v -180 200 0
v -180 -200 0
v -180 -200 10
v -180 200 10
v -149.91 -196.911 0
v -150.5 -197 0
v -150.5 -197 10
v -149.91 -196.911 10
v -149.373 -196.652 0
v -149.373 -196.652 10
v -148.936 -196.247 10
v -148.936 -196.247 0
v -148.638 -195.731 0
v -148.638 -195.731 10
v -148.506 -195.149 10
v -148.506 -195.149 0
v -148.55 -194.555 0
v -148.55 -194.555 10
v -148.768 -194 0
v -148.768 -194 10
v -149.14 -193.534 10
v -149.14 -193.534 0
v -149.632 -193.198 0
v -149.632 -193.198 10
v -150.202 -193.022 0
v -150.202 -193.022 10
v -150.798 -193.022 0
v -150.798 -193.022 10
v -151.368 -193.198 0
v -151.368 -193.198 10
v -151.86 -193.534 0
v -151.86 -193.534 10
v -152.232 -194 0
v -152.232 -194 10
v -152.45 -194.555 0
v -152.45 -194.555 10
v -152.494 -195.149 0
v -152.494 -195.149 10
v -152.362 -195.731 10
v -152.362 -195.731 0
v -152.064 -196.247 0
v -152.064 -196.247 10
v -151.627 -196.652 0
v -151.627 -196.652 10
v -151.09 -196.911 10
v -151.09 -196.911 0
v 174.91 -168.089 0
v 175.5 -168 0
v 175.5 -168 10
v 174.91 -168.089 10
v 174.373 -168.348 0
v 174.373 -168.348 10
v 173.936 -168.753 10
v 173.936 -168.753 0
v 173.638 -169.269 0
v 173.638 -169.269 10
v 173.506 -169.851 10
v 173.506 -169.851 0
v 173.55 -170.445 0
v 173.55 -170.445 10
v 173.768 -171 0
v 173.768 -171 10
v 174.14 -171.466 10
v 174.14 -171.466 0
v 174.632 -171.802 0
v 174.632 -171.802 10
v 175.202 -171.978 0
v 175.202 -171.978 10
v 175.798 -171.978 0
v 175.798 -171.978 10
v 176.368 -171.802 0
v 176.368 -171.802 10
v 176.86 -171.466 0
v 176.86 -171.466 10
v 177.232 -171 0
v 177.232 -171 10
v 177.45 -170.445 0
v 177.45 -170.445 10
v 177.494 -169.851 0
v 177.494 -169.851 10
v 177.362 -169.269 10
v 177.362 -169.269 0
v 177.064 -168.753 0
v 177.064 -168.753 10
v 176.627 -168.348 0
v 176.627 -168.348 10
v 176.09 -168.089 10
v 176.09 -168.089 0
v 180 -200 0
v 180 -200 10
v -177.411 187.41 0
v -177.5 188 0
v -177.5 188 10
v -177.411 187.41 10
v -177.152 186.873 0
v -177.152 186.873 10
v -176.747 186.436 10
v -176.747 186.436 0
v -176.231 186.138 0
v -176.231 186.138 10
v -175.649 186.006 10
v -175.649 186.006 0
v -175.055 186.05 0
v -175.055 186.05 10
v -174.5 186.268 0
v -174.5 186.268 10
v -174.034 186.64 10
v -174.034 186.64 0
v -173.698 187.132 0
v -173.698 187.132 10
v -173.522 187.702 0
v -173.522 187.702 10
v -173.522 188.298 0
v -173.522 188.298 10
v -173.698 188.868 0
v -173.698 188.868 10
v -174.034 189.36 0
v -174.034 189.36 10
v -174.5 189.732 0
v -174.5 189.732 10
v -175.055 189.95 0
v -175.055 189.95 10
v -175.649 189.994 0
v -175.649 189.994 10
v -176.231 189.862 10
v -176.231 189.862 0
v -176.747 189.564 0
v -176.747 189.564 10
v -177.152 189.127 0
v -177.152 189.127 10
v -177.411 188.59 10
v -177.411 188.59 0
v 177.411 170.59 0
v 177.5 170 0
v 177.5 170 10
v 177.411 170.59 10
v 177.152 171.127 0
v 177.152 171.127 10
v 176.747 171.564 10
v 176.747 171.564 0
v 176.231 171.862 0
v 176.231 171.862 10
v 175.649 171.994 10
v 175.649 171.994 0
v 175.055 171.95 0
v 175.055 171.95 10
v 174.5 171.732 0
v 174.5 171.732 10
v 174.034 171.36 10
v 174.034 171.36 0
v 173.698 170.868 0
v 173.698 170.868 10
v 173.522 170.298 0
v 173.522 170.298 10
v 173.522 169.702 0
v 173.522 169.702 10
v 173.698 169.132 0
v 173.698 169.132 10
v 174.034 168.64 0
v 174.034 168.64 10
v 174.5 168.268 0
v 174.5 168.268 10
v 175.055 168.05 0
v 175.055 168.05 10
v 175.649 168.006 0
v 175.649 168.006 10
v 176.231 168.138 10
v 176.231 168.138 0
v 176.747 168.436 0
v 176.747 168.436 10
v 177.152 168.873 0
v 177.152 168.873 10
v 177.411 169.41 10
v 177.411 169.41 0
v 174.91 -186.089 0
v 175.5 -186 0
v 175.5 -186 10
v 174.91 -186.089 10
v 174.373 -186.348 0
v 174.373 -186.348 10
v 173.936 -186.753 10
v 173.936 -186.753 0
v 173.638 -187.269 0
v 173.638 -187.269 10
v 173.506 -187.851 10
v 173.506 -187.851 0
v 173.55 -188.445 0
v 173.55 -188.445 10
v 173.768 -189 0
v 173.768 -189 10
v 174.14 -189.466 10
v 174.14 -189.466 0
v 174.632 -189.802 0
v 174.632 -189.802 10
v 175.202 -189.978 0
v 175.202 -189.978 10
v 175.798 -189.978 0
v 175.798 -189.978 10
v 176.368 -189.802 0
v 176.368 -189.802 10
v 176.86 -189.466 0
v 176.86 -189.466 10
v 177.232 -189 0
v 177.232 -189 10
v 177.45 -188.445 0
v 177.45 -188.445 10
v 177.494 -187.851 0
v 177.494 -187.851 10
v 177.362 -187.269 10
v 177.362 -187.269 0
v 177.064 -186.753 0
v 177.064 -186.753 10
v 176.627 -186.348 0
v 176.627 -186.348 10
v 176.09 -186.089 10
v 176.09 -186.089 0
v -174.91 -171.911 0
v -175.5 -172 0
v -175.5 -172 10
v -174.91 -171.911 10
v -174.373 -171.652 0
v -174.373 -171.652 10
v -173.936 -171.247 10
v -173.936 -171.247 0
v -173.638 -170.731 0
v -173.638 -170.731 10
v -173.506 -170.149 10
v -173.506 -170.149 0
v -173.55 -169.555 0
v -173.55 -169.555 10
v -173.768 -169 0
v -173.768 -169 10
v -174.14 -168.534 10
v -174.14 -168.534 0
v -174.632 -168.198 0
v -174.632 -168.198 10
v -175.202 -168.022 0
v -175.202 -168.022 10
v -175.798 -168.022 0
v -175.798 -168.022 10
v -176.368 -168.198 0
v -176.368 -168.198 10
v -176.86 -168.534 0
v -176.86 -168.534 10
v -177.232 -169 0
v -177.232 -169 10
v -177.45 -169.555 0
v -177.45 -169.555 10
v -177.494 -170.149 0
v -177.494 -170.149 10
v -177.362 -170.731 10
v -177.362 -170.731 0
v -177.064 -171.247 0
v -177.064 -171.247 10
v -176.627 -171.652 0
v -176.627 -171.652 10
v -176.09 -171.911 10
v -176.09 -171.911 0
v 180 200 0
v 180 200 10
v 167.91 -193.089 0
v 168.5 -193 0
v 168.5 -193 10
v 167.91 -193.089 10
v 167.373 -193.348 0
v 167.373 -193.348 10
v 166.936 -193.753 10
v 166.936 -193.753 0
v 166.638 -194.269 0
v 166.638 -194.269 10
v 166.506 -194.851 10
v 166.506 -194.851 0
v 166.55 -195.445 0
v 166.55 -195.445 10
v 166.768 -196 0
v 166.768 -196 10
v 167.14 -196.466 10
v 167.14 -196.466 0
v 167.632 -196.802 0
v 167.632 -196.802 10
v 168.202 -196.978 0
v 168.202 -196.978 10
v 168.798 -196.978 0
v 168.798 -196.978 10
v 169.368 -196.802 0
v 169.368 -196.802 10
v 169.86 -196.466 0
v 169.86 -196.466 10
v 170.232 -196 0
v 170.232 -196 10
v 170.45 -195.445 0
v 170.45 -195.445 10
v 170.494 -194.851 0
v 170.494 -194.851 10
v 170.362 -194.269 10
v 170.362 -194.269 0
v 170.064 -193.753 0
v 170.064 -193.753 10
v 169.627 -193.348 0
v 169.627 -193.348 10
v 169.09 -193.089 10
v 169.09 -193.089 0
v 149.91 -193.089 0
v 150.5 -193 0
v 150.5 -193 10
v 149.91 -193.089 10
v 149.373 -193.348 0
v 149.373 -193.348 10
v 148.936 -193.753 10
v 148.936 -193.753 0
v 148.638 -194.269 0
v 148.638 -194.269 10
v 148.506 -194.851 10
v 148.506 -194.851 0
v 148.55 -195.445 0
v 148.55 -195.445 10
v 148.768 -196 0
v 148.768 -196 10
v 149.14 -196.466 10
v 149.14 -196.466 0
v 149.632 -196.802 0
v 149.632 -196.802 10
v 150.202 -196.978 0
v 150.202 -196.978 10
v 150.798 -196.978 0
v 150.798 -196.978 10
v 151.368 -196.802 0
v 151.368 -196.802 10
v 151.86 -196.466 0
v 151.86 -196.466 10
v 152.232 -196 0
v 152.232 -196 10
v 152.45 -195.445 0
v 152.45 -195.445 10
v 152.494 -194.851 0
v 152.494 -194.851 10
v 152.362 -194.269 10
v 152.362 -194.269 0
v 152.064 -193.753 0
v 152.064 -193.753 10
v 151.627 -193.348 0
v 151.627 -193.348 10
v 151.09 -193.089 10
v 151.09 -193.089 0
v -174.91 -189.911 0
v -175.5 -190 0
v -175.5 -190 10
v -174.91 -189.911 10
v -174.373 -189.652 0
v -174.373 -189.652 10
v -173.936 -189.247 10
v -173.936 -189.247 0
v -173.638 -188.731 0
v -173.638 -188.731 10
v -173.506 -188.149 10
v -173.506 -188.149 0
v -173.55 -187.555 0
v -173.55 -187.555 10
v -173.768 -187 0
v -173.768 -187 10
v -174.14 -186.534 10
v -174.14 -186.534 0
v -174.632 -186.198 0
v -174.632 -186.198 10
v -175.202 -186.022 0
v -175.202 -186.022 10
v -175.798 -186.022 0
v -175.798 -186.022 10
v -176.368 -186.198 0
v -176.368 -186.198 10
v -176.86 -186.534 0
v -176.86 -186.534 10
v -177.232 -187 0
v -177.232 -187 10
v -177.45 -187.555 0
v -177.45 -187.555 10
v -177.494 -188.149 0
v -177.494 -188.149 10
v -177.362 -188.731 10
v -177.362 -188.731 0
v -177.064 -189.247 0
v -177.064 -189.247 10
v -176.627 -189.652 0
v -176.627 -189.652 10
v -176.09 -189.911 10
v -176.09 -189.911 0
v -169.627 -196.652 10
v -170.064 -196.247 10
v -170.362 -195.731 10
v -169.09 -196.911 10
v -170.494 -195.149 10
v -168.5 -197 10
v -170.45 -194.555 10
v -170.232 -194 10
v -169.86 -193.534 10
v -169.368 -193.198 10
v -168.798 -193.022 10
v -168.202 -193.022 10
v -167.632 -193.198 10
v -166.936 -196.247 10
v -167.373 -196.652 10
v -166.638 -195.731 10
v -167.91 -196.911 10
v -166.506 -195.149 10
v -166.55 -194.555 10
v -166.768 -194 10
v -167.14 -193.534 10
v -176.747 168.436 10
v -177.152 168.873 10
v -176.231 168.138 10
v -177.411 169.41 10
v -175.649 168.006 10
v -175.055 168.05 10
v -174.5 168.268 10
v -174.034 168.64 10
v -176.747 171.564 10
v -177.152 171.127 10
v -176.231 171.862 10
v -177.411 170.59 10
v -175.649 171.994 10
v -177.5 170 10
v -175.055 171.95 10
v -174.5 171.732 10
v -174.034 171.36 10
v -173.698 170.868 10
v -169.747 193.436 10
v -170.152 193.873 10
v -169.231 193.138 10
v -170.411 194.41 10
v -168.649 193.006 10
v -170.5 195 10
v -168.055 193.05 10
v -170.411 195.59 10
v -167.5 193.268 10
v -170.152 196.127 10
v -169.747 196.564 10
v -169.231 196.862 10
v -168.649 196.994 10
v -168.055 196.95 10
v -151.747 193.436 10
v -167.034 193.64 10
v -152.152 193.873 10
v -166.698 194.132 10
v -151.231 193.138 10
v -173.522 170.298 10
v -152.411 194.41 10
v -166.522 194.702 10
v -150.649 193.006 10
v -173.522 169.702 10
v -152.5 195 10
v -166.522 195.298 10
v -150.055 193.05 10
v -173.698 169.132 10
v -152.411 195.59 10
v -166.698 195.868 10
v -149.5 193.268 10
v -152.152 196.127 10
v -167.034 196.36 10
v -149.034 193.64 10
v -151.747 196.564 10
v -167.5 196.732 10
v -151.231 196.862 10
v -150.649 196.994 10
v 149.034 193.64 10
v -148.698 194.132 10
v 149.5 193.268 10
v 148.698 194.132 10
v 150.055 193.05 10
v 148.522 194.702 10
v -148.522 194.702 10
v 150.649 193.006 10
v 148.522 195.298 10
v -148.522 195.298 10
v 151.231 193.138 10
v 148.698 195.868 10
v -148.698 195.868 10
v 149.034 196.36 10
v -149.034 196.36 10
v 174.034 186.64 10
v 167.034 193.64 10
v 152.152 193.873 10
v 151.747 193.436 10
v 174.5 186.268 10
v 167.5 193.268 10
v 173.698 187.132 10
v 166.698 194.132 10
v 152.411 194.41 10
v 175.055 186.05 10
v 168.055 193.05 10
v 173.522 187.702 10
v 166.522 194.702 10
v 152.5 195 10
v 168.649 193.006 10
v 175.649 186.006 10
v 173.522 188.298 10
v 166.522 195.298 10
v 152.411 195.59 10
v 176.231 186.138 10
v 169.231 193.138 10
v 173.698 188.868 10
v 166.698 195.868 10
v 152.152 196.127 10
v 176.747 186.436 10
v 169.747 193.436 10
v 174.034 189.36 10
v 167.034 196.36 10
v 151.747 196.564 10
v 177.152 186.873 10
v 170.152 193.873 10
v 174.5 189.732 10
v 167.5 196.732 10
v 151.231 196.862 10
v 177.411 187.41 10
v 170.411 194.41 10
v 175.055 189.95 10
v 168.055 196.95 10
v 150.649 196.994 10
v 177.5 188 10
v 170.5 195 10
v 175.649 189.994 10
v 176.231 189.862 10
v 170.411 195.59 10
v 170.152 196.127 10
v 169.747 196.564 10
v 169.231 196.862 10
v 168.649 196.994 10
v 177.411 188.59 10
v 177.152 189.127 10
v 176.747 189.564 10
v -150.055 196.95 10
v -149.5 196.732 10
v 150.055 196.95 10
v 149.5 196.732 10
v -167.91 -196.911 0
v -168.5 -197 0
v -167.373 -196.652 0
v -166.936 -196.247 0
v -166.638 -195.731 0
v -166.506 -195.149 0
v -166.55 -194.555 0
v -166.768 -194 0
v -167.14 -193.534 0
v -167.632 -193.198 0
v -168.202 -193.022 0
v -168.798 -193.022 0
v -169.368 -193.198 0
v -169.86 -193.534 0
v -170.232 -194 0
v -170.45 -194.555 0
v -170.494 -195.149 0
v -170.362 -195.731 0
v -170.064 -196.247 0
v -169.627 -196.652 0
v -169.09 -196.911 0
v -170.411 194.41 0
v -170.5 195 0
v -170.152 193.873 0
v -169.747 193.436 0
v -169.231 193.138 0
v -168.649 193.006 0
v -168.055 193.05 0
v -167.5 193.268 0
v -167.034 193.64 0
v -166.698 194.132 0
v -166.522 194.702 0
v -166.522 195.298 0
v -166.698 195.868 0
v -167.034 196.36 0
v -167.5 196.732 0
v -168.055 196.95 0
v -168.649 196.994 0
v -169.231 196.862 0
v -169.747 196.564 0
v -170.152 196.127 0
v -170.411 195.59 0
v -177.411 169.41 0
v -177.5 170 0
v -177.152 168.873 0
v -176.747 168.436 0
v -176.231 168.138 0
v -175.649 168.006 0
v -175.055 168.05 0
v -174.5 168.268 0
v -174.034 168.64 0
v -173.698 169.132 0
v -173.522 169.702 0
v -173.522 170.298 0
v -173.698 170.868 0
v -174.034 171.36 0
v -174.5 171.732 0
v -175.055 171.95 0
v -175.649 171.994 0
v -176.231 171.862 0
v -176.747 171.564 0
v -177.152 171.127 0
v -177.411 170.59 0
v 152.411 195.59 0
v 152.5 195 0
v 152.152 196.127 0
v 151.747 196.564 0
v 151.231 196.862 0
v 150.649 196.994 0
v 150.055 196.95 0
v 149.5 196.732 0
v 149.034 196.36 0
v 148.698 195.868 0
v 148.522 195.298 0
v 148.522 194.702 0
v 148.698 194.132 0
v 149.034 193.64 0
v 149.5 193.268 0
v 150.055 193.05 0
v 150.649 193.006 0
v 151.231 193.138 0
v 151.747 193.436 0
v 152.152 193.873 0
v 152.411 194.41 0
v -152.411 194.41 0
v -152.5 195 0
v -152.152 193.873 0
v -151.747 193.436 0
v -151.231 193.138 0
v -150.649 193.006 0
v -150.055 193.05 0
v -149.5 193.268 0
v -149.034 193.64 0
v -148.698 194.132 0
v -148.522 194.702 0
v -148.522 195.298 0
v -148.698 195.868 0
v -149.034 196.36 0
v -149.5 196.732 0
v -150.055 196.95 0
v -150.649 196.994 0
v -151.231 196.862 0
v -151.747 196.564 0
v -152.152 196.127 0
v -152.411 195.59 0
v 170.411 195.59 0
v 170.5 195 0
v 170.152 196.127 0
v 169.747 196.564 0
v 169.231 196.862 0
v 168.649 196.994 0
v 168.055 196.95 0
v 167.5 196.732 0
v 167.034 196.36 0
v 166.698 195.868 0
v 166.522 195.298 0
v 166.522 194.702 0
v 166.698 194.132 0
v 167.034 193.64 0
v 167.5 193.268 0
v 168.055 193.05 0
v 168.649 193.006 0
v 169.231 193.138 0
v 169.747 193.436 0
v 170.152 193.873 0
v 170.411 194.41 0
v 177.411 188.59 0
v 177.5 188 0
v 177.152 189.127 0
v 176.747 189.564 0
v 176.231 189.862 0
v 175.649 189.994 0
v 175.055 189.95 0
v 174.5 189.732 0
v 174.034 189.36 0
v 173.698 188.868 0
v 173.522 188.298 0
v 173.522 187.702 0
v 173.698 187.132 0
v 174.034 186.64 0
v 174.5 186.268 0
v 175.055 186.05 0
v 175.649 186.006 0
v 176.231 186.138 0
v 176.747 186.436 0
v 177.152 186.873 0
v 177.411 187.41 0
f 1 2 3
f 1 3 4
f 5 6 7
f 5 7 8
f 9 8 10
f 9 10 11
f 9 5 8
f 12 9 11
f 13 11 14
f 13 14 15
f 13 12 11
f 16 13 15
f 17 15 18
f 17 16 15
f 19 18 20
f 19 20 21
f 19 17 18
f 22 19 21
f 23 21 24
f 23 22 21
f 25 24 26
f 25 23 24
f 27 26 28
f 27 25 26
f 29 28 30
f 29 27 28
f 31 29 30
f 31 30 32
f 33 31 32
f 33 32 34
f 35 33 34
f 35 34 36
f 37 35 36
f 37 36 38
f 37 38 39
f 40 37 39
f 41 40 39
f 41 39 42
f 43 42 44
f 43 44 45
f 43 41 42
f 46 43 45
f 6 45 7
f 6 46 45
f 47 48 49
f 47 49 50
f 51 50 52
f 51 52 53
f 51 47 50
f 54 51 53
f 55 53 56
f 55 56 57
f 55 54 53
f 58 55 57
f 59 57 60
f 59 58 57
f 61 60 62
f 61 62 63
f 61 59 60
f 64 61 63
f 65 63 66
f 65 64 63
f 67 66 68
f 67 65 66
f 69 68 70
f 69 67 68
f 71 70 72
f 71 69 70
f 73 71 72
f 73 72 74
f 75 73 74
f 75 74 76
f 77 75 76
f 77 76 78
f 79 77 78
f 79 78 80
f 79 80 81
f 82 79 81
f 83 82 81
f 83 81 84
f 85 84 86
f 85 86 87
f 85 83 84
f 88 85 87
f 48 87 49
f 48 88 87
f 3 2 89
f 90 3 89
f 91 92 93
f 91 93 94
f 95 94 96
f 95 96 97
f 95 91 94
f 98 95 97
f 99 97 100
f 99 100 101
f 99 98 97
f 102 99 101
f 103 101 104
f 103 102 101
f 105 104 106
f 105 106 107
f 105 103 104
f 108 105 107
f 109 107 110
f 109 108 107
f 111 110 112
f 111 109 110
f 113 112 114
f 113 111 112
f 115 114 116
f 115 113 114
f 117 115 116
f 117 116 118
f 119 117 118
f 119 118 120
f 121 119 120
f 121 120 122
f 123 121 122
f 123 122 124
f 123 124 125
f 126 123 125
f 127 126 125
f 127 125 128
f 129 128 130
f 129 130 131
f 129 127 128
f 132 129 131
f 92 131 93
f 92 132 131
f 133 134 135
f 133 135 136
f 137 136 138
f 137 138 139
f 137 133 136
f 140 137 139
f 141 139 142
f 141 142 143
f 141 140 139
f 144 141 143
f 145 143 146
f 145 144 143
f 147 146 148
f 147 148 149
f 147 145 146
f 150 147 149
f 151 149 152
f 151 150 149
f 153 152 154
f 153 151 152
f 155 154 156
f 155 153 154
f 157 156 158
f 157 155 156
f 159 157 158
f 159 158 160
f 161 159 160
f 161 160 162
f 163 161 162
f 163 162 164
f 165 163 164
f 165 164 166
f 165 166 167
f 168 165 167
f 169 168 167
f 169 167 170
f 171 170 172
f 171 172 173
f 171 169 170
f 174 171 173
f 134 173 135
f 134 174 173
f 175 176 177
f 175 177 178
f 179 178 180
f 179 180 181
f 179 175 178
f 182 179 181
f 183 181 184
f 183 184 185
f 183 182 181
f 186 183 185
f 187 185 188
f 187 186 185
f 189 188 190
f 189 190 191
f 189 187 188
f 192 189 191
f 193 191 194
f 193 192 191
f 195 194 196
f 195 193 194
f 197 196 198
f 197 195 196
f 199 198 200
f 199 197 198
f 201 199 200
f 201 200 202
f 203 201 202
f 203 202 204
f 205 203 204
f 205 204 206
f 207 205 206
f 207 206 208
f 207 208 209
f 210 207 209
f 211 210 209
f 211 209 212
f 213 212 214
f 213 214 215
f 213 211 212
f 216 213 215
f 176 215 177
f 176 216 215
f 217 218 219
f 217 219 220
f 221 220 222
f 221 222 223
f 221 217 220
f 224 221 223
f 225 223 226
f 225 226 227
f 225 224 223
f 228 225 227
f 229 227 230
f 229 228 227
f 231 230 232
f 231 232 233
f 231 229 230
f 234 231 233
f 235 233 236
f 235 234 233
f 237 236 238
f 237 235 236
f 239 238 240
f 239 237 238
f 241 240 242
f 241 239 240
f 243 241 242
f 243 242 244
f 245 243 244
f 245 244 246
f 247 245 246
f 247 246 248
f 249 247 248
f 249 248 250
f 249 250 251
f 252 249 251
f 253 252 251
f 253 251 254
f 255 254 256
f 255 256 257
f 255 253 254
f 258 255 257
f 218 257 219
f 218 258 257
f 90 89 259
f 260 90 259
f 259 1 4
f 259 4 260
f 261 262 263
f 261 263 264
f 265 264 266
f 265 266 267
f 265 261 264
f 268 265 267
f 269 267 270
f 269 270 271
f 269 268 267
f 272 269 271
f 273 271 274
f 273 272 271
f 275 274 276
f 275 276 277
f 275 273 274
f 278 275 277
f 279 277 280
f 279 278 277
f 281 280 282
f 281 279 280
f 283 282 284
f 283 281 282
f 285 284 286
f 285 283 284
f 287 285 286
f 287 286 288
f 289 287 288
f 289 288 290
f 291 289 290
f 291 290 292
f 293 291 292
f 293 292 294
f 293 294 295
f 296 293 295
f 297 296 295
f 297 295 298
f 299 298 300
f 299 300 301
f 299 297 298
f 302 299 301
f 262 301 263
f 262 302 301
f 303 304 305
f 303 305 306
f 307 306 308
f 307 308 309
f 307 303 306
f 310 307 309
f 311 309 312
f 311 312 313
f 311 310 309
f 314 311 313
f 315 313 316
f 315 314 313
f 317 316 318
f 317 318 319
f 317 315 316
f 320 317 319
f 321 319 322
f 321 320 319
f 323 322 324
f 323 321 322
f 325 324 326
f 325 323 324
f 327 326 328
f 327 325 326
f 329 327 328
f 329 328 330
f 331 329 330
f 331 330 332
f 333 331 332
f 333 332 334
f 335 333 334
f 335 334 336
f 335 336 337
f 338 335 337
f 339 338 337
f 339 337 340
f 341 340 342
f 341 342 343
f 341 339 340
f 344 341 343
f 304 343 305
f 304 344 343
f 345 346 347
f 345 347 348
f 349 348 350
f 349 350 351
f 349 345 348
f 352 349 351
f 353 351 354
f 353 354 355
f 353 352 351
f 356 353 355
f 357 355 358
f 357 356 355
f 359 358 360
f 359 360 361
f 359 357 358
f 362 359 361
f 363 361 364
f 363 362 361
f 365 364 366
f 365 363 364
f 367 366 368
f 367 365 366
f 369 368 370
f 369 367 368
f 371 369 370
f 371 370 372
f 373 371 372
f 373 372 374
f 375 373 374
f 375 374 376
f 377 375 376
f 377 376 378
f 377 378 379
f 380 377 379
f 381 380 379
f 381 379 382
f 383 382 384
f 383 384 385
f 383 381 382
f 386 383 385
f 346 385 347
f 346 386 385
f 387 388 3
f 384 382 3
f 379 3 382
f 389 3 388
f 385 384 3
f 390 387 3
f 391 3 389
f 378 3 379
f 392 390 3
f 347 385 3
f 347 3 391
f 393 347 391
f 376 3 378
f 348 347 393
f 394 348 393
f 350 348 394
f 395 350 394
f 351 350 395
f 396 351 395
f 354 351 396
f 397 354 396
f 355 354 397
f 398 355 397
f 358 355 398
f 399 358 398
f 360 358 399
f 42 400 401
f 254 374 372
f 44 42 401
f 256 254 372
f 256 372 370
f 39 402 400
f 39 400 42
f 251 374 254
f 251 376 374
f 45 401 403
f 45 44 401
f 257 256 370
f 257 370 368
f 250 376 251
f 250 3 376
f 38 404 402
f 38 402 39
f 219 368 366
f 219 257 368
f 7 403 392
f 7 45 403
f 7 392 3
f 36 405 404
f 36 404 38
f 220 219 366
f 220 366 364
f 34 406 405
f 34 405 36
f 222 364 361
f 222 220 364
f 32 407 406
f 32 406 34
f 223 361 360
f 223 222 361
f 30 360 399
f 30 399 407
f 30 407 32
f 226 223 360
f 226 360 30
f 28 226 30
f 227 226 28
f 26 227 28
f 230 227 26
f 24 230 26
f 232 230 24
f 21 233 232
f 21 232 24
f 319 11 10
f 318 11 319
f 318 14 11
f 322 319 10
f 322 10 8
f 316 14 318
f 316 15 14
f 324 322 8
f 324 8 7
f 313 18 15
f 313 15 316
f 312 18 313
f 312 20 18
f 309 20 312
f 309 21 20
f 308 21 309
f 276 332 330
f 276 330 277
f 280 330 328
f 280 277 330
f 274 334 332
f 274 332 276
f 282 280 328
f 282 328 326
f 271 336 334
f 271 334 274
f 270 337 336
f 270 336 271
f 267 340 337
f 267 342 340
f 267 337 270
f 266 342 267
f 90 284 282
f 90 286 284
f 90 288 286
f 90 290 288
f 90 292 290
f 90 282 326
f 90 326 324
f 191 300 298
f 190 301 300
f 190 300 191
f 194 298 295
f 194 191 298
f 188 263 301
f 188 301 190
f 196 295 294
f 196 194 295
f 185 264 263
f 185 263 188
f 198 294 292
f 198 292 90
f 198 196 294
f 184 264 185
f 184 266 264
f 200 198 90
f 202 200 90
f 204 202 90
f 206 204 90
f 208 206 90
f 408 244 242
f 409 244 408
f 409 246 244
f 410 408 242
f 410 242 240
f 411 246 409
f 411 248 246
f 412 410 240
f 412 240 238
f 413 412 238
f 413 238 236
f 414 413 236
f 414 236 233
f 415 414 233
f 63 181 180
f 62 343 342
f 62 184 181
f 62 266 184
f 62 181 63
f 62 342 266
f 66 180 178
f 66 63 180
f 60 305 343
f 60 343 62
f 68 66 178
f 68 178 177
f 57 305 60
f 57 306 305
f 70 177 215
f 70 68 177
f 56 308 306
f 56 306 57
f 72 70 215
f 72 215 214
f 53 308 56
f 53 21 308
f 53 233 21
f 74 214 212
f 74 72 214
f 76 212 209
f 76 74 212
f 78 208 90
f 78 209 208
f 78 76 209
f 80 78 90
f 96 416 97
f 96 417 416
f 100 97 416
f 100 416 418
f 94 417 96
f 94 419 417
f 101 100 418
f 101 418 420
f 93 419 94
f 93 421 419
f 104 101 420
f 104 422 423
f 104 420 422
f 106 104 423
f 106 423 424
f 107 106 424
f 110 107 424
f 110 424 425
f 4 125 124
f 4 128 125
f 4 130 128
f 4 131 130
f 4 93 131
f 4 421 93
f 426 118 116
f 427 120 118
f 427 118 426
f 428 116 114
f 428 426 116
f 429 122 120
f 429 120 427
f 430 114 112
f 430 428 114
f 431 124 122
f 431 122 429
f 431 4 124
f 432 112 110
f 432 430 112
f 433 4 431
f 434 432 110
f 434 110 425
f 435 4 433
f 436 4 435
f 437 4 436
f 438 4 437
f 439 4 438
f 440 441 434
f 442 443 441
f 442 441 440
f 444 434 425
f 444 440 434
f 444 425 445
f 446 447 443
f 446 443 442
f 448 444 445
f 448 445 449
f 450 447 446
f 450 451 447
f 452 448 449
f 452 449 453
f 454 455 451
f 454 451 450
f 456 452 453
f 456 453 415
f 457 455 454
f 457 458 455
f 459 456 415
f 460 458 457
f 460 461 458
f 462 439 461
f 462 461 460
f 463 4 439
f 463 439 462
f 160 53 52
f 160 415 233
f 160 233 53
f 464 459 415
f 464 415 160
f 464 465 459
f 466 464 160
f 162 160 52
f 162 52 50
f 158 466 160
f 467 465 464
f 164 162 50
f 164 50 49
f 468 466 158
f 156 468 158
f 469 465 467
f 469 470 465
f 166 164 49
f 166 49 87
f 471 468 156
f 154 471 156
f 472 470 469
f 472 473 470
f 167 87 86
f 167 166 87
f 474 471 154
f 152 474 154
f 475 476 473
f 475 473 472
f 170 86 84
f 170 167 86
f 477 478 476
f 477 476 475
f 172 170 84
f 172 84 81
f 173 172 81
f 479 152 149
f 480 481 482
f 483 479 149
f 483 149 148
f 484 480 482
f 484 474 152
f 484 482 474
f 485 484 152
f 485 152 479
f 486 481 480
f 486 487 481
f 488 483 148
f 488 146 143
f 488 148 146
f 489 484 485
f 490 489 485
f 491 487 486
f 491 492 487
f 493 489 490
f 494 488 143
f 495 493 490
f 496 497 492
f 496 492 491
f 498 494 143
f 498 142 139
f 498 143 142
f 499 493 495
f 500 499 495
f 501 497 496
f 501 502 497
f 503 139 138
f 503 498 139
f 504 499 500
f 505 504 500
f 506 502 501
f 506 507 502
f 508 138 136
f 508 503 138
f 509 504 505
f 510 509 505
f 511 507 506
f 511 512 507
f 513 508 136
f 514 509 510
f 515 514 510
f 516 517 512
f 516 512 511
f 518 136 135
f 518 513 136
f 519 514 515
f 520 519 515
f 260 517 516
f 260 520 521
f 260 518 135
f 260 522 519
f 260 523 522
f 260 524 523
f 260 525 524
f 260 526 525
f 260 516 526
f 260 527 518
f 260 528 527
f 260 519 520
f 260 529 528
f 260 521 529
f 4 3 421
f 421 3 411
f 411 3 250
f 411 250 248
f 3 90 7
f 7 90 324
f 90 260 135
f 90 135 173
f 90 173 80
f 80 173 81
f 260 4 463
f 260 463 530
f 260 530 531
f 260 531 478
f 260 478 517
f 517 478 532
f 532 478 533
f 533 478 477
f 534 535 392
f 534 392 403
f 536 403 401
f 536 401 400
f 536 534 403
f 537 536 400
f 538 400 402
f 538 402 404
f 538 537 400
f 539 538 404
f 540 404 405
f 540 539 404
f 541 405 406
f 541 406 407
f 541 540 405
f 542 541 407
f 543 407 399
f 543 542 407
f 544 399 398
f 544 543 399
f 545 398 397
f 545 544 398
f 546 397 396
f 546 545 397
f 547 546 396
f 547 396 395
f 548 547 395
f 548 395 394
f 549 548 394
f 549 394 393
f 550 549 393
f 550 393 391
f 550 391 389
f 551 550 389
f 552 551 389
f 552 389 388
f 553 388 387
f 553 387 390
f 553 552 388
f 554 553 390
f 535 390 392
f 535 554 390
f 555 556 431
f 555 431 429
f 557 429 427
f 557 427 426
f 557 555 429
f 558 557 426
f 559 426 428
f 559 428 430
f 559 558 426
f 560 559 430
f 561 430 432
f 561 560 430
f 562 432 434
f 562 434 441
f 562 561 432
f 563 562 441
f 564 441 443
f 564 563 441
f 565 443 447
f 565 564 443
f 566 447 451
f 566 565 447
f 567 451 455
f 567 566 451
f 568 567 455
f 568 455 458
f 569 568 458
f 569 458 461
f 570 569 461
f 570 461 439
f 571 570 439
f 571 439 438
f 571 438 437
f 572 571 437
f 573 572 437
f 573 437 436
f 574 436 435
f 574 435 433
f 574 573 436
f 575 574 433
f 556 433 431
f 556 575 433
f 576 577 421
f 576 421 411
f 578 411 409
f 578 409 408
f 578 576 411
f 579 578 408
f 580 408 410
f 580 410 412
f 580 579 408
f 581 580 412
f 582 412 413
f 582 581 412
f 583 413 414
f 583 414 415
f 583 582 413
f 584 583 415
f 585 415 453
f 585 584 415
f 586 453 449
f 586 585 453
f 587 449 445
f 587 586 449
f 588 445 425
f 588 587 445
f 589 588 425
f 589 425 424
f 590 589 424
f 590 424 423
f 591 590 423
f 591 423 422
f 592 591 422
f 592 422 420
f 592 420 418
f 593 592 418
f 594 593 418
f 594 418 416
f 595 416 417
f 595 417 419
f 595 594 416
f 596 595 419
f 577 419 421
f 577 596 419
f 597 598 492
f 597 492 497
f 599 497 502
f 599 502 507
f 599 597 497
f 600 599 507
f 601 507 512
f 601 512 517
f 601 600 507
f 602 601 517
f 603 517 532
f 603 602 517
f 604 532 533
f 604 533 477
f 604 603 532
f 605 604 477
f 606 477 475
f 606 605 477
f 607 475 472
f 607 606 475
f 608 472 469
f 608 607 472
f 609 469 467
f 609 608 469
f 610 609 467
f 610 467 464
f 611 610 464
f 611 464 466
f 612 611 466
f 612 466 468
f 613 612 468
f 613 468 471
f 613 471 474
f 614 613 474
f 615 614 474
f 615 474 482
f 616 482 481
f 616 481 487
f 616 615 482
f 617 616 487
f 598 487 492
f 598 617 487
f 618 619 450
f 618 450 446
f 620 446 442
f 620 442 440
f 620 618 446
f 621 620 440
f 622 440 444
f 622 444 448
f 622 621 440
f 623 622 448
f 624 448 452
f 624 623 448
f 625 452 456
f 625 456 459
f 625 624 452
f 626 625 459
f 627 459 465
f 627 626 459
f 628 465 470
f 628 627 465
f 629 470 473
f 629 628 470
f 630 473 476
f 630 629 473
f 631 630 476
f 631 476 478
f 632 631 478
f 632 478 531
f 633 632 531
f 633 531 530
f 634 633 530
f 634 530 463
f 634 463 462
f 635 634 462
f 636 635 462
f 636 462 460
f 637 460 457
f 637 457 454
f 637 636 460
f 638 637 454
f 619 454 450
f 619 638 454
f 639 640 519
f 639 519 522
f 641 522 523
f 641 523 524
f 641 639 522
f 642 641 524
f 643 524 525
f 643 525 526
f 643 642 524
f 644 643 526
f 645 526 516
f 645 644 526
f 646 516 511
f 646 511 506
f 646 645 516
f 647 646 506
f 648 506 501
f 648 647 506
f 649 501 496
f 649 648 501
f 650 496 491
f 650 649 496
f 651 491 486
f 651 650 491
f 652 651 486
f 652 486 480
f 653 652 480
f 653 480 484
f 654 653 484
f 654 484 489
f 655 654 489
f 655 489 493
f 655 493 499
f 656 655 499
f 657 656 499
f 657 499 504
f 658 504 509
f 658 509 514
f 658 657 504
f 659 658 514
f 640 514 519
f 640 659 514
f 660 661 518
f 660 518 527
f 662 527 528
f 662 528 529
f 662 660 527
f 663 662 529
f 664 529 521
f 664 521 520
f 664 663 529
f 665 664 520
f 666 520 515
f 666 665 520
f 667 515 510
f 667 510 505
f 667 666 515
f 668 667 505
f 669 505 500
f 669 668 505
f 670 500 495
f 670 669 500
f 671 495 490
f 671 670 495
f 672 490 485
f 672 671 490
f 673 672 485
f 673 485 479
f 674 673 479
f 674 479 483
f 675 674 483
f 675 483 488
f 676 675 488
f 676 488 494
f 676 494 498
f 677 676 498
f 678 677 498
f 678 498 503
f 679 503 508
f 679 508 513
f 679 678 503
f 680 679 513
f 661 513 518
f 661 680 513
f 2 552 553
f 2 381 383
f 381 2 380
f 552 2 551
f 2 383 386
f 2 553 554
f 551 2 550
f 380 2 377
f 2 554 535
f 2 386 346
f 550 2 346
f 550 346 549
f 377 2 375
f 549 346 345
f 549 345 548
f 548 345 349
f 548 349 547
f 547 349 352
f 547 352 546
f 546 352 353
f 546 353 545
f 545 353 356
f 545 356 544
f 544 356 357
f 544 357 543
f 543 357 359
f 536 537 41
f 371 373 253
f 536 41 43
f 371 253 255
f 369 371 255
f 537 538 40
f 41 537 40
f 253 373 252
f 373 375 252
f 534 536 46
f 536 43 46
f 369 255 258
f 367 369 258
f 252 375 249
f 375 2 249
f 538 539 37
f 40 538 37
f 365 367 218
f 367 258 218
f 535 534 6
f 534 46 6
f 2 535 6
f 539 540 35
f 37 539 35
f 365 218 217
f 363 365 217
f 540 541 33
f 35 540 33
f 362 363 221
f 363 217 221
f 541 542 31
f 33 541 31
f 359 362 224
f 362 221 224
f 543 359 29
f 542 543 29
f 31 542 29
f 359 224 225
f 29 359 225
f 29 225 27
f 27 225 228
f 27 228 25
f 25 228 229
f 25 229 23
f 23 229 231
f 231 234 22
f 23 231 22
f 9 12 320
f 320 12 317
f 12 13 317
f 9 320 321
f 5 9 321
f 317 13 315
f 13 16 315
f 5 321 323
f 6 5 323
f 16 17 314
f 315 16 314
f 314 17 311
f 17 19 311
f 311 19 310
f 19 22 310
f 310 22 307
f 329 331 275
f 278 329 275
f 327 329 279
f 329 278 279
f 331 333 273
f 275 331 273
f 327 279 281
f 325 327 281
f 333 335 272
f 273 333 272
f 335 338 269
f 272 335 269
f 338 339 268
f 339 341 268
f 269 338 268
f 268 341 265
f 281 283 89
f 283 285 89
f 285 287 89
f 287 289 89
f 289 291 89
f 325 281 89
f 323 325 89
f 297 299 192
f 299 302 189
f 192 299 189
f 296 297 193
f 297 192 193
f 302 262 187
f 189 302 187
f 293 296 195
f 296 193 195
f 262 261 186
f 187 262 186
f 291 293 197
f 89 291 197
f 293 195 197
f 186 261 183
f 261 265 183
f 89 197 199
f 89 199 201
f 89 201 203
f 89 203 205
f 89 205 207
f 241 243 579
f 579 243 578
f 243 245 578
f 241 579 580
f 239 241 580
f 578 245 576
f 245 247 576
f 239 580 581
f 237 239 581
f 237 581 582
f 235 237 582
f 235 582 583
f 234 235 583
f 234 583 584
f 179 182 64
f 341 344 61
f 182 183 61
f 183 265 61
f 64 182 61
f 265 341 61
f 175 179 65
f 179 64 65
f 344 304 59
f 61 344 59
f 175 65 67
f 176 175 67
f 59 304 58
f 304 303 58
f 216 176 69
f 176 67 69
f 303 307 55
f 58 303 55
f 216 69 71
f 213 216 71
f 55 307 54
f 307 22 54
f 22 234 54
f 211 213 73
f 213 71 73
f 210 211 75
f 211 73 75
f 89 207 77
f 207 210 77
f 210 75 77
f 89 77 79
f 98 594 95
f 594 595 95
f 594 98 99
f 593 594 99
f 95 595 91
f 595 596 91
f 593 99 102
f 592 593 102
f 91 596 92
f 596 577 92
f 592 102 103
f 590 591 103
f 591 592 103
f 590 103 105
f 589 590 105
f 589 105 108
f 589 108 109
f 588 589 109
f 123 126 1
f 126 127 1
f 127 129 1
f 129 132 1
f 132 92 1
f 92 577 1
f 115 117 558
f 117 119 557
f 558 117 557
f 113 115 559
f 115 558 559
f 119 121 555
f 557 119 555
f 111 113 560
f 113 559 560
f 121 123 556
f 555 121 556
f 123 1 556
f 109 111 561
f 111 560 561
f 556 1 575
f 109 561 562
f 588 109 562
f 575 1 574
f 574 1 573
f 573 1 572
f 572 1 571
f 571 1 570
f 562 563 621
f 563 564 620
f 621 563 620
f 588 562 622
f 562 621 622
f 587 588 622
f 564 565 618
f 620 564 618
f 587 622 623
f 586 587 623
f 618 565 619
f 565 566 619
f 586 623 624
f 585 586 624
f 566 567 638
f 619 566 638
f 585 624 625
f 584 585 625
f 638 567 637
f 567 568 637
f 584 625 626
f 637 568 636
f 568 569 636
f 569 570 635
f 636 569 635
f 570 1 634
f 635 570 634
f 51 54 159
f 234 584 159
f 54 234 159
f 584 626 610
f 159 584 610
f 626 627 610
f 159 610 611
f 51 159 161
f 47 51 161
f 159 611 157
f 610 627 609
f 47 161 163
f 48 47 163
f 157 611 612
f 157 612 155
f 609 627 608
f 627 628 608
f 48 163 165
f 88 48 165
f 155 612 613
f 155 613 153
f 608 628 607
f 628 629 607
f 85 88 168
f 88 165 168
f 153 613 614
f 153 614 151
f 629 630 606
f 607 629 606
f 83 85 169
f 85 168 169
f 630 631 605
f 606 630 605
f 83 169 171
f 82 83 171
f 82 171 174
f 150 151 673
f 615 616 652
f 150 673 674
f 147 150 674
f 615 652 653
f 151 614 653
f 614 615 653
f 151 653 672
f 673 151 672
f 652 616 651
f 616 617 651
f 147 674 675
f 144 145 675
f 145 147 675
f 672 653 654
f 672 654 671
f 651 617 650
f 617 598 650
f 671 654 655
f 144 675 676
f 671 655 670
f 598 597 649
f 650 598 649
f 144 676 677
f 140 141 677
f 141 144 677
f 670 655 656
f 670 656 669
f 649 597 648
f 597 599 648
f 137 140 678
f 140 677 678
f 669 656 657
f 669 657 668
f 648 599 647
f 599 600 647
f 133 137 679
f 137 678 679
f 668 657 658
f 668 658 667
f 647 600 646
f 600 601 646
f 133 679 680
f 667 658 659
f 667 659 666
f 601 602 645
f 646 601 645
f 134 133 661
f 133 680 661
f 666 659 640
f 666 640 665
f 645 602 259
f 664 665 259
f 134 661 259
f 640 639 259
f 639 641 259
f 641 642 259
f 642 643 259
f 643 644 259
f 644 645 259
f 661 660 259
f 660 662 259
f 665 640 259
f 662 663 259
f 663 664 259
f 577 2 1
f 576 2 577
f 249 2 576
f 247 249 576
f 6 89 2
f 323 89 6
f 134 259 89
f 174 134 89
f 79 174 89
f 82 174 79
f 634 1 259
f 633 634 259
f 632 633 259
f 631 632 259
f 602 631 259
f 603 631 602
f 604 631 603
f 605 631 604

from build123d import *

# Parameters (mm, degrees)
SKETCH_1_W      = 360
SKETCH_1_H      = 400
SKETCH_1_R      = 2
EXTRUDE_1_DEPTH = 10


with BuildPart() as part:
    # Эскиз1 → Бобышка-Вытянуть1 (new body)
    with BuildSketch(Plane.XY):
        Rectangle(SKETCH_1_W, SKETCH_1_H)
        with Locations((150.5, 195)):
            Circle(SKETCH_1_R, mode=Mode.SUBTRACT)
        with Locations((168.5, 195)):
            Circle(SKETCH_1_R, mode=Mode.SUBTRACT)
        with Locations((175.5, 170)):
            Circle(SKETCH_1_R, mode=Mode.SUBTRACT)
        with Locations((175.5, 188)):
            Circle(SKETCH_1_R, mode=Mode.SUBTRACT)
        with Locations(Location((-150.5, 195, 0), (0, 0, 180))):
            Circle(SKETCH_1_R, mode=Mode.SUBTRACT)
        with Locations(Location((-168.5, 195, 0), (0, 0, 180))):
            Circle(SKETCH_1_R, mode=Mode.SUBTRACT)
        with Locations(Location((-175.5, 170, 0), (0, 0, 180))):
            Circle(SKETCH_1_R, mode=Mode.SUBTRACT)
        with Locations(Location((-175.5, 188, 0), (0, 0, 180))):
            Circle(SKETCH_1_R, mode=Mode.SUBTRACT)
        with Locations(Location((-150.5, -195, 0), (0, 0, 270))):
            Circle(SKETCH_1_R, mode=Mode.SUBTRACT)
        with Locations(Location((-168.5, -195, 0), (0, 0, 270))):
            Circle(SKETCH_1_R, mode=Mode.SUBTRACT)
        with Locations(Location((-175.5, -170, 0), (0, 0, 270))):
            Circle(SKETCH_1_R, mode=Mode.SUBTRACT)
        with Locations(Location((-175.5, -188, 0), (0, 0, 270))):
            Circle(SKETCH_1_R, mode=Mode.SUBTRACT)
        with Locations(Location((150.5, -195, 0), (0, 0, 90))):
            Circle(SKETCH_1_R, mode=Mode.SUBTRACT)
        with Locations(Location((168.5, -195, 0), (0, 0, 90))):
            Circle(SKETCH_1_R, mode=Mode.SUBTRACT)
        with Locations(Location((175.5, -170, 0), (0, 0, 90))):
            Circle(SKETCH_1_R, mode=Mode.SUBTRACT)
        with Locations(Location((175.5, -188, 0), (0, 0, 90))):
            Circle(SKETCH_1_R, mode=Mode.SUBTRACT)
    extrude(amount=EXTRUDE_1_DEPTH)


solid = part.part
